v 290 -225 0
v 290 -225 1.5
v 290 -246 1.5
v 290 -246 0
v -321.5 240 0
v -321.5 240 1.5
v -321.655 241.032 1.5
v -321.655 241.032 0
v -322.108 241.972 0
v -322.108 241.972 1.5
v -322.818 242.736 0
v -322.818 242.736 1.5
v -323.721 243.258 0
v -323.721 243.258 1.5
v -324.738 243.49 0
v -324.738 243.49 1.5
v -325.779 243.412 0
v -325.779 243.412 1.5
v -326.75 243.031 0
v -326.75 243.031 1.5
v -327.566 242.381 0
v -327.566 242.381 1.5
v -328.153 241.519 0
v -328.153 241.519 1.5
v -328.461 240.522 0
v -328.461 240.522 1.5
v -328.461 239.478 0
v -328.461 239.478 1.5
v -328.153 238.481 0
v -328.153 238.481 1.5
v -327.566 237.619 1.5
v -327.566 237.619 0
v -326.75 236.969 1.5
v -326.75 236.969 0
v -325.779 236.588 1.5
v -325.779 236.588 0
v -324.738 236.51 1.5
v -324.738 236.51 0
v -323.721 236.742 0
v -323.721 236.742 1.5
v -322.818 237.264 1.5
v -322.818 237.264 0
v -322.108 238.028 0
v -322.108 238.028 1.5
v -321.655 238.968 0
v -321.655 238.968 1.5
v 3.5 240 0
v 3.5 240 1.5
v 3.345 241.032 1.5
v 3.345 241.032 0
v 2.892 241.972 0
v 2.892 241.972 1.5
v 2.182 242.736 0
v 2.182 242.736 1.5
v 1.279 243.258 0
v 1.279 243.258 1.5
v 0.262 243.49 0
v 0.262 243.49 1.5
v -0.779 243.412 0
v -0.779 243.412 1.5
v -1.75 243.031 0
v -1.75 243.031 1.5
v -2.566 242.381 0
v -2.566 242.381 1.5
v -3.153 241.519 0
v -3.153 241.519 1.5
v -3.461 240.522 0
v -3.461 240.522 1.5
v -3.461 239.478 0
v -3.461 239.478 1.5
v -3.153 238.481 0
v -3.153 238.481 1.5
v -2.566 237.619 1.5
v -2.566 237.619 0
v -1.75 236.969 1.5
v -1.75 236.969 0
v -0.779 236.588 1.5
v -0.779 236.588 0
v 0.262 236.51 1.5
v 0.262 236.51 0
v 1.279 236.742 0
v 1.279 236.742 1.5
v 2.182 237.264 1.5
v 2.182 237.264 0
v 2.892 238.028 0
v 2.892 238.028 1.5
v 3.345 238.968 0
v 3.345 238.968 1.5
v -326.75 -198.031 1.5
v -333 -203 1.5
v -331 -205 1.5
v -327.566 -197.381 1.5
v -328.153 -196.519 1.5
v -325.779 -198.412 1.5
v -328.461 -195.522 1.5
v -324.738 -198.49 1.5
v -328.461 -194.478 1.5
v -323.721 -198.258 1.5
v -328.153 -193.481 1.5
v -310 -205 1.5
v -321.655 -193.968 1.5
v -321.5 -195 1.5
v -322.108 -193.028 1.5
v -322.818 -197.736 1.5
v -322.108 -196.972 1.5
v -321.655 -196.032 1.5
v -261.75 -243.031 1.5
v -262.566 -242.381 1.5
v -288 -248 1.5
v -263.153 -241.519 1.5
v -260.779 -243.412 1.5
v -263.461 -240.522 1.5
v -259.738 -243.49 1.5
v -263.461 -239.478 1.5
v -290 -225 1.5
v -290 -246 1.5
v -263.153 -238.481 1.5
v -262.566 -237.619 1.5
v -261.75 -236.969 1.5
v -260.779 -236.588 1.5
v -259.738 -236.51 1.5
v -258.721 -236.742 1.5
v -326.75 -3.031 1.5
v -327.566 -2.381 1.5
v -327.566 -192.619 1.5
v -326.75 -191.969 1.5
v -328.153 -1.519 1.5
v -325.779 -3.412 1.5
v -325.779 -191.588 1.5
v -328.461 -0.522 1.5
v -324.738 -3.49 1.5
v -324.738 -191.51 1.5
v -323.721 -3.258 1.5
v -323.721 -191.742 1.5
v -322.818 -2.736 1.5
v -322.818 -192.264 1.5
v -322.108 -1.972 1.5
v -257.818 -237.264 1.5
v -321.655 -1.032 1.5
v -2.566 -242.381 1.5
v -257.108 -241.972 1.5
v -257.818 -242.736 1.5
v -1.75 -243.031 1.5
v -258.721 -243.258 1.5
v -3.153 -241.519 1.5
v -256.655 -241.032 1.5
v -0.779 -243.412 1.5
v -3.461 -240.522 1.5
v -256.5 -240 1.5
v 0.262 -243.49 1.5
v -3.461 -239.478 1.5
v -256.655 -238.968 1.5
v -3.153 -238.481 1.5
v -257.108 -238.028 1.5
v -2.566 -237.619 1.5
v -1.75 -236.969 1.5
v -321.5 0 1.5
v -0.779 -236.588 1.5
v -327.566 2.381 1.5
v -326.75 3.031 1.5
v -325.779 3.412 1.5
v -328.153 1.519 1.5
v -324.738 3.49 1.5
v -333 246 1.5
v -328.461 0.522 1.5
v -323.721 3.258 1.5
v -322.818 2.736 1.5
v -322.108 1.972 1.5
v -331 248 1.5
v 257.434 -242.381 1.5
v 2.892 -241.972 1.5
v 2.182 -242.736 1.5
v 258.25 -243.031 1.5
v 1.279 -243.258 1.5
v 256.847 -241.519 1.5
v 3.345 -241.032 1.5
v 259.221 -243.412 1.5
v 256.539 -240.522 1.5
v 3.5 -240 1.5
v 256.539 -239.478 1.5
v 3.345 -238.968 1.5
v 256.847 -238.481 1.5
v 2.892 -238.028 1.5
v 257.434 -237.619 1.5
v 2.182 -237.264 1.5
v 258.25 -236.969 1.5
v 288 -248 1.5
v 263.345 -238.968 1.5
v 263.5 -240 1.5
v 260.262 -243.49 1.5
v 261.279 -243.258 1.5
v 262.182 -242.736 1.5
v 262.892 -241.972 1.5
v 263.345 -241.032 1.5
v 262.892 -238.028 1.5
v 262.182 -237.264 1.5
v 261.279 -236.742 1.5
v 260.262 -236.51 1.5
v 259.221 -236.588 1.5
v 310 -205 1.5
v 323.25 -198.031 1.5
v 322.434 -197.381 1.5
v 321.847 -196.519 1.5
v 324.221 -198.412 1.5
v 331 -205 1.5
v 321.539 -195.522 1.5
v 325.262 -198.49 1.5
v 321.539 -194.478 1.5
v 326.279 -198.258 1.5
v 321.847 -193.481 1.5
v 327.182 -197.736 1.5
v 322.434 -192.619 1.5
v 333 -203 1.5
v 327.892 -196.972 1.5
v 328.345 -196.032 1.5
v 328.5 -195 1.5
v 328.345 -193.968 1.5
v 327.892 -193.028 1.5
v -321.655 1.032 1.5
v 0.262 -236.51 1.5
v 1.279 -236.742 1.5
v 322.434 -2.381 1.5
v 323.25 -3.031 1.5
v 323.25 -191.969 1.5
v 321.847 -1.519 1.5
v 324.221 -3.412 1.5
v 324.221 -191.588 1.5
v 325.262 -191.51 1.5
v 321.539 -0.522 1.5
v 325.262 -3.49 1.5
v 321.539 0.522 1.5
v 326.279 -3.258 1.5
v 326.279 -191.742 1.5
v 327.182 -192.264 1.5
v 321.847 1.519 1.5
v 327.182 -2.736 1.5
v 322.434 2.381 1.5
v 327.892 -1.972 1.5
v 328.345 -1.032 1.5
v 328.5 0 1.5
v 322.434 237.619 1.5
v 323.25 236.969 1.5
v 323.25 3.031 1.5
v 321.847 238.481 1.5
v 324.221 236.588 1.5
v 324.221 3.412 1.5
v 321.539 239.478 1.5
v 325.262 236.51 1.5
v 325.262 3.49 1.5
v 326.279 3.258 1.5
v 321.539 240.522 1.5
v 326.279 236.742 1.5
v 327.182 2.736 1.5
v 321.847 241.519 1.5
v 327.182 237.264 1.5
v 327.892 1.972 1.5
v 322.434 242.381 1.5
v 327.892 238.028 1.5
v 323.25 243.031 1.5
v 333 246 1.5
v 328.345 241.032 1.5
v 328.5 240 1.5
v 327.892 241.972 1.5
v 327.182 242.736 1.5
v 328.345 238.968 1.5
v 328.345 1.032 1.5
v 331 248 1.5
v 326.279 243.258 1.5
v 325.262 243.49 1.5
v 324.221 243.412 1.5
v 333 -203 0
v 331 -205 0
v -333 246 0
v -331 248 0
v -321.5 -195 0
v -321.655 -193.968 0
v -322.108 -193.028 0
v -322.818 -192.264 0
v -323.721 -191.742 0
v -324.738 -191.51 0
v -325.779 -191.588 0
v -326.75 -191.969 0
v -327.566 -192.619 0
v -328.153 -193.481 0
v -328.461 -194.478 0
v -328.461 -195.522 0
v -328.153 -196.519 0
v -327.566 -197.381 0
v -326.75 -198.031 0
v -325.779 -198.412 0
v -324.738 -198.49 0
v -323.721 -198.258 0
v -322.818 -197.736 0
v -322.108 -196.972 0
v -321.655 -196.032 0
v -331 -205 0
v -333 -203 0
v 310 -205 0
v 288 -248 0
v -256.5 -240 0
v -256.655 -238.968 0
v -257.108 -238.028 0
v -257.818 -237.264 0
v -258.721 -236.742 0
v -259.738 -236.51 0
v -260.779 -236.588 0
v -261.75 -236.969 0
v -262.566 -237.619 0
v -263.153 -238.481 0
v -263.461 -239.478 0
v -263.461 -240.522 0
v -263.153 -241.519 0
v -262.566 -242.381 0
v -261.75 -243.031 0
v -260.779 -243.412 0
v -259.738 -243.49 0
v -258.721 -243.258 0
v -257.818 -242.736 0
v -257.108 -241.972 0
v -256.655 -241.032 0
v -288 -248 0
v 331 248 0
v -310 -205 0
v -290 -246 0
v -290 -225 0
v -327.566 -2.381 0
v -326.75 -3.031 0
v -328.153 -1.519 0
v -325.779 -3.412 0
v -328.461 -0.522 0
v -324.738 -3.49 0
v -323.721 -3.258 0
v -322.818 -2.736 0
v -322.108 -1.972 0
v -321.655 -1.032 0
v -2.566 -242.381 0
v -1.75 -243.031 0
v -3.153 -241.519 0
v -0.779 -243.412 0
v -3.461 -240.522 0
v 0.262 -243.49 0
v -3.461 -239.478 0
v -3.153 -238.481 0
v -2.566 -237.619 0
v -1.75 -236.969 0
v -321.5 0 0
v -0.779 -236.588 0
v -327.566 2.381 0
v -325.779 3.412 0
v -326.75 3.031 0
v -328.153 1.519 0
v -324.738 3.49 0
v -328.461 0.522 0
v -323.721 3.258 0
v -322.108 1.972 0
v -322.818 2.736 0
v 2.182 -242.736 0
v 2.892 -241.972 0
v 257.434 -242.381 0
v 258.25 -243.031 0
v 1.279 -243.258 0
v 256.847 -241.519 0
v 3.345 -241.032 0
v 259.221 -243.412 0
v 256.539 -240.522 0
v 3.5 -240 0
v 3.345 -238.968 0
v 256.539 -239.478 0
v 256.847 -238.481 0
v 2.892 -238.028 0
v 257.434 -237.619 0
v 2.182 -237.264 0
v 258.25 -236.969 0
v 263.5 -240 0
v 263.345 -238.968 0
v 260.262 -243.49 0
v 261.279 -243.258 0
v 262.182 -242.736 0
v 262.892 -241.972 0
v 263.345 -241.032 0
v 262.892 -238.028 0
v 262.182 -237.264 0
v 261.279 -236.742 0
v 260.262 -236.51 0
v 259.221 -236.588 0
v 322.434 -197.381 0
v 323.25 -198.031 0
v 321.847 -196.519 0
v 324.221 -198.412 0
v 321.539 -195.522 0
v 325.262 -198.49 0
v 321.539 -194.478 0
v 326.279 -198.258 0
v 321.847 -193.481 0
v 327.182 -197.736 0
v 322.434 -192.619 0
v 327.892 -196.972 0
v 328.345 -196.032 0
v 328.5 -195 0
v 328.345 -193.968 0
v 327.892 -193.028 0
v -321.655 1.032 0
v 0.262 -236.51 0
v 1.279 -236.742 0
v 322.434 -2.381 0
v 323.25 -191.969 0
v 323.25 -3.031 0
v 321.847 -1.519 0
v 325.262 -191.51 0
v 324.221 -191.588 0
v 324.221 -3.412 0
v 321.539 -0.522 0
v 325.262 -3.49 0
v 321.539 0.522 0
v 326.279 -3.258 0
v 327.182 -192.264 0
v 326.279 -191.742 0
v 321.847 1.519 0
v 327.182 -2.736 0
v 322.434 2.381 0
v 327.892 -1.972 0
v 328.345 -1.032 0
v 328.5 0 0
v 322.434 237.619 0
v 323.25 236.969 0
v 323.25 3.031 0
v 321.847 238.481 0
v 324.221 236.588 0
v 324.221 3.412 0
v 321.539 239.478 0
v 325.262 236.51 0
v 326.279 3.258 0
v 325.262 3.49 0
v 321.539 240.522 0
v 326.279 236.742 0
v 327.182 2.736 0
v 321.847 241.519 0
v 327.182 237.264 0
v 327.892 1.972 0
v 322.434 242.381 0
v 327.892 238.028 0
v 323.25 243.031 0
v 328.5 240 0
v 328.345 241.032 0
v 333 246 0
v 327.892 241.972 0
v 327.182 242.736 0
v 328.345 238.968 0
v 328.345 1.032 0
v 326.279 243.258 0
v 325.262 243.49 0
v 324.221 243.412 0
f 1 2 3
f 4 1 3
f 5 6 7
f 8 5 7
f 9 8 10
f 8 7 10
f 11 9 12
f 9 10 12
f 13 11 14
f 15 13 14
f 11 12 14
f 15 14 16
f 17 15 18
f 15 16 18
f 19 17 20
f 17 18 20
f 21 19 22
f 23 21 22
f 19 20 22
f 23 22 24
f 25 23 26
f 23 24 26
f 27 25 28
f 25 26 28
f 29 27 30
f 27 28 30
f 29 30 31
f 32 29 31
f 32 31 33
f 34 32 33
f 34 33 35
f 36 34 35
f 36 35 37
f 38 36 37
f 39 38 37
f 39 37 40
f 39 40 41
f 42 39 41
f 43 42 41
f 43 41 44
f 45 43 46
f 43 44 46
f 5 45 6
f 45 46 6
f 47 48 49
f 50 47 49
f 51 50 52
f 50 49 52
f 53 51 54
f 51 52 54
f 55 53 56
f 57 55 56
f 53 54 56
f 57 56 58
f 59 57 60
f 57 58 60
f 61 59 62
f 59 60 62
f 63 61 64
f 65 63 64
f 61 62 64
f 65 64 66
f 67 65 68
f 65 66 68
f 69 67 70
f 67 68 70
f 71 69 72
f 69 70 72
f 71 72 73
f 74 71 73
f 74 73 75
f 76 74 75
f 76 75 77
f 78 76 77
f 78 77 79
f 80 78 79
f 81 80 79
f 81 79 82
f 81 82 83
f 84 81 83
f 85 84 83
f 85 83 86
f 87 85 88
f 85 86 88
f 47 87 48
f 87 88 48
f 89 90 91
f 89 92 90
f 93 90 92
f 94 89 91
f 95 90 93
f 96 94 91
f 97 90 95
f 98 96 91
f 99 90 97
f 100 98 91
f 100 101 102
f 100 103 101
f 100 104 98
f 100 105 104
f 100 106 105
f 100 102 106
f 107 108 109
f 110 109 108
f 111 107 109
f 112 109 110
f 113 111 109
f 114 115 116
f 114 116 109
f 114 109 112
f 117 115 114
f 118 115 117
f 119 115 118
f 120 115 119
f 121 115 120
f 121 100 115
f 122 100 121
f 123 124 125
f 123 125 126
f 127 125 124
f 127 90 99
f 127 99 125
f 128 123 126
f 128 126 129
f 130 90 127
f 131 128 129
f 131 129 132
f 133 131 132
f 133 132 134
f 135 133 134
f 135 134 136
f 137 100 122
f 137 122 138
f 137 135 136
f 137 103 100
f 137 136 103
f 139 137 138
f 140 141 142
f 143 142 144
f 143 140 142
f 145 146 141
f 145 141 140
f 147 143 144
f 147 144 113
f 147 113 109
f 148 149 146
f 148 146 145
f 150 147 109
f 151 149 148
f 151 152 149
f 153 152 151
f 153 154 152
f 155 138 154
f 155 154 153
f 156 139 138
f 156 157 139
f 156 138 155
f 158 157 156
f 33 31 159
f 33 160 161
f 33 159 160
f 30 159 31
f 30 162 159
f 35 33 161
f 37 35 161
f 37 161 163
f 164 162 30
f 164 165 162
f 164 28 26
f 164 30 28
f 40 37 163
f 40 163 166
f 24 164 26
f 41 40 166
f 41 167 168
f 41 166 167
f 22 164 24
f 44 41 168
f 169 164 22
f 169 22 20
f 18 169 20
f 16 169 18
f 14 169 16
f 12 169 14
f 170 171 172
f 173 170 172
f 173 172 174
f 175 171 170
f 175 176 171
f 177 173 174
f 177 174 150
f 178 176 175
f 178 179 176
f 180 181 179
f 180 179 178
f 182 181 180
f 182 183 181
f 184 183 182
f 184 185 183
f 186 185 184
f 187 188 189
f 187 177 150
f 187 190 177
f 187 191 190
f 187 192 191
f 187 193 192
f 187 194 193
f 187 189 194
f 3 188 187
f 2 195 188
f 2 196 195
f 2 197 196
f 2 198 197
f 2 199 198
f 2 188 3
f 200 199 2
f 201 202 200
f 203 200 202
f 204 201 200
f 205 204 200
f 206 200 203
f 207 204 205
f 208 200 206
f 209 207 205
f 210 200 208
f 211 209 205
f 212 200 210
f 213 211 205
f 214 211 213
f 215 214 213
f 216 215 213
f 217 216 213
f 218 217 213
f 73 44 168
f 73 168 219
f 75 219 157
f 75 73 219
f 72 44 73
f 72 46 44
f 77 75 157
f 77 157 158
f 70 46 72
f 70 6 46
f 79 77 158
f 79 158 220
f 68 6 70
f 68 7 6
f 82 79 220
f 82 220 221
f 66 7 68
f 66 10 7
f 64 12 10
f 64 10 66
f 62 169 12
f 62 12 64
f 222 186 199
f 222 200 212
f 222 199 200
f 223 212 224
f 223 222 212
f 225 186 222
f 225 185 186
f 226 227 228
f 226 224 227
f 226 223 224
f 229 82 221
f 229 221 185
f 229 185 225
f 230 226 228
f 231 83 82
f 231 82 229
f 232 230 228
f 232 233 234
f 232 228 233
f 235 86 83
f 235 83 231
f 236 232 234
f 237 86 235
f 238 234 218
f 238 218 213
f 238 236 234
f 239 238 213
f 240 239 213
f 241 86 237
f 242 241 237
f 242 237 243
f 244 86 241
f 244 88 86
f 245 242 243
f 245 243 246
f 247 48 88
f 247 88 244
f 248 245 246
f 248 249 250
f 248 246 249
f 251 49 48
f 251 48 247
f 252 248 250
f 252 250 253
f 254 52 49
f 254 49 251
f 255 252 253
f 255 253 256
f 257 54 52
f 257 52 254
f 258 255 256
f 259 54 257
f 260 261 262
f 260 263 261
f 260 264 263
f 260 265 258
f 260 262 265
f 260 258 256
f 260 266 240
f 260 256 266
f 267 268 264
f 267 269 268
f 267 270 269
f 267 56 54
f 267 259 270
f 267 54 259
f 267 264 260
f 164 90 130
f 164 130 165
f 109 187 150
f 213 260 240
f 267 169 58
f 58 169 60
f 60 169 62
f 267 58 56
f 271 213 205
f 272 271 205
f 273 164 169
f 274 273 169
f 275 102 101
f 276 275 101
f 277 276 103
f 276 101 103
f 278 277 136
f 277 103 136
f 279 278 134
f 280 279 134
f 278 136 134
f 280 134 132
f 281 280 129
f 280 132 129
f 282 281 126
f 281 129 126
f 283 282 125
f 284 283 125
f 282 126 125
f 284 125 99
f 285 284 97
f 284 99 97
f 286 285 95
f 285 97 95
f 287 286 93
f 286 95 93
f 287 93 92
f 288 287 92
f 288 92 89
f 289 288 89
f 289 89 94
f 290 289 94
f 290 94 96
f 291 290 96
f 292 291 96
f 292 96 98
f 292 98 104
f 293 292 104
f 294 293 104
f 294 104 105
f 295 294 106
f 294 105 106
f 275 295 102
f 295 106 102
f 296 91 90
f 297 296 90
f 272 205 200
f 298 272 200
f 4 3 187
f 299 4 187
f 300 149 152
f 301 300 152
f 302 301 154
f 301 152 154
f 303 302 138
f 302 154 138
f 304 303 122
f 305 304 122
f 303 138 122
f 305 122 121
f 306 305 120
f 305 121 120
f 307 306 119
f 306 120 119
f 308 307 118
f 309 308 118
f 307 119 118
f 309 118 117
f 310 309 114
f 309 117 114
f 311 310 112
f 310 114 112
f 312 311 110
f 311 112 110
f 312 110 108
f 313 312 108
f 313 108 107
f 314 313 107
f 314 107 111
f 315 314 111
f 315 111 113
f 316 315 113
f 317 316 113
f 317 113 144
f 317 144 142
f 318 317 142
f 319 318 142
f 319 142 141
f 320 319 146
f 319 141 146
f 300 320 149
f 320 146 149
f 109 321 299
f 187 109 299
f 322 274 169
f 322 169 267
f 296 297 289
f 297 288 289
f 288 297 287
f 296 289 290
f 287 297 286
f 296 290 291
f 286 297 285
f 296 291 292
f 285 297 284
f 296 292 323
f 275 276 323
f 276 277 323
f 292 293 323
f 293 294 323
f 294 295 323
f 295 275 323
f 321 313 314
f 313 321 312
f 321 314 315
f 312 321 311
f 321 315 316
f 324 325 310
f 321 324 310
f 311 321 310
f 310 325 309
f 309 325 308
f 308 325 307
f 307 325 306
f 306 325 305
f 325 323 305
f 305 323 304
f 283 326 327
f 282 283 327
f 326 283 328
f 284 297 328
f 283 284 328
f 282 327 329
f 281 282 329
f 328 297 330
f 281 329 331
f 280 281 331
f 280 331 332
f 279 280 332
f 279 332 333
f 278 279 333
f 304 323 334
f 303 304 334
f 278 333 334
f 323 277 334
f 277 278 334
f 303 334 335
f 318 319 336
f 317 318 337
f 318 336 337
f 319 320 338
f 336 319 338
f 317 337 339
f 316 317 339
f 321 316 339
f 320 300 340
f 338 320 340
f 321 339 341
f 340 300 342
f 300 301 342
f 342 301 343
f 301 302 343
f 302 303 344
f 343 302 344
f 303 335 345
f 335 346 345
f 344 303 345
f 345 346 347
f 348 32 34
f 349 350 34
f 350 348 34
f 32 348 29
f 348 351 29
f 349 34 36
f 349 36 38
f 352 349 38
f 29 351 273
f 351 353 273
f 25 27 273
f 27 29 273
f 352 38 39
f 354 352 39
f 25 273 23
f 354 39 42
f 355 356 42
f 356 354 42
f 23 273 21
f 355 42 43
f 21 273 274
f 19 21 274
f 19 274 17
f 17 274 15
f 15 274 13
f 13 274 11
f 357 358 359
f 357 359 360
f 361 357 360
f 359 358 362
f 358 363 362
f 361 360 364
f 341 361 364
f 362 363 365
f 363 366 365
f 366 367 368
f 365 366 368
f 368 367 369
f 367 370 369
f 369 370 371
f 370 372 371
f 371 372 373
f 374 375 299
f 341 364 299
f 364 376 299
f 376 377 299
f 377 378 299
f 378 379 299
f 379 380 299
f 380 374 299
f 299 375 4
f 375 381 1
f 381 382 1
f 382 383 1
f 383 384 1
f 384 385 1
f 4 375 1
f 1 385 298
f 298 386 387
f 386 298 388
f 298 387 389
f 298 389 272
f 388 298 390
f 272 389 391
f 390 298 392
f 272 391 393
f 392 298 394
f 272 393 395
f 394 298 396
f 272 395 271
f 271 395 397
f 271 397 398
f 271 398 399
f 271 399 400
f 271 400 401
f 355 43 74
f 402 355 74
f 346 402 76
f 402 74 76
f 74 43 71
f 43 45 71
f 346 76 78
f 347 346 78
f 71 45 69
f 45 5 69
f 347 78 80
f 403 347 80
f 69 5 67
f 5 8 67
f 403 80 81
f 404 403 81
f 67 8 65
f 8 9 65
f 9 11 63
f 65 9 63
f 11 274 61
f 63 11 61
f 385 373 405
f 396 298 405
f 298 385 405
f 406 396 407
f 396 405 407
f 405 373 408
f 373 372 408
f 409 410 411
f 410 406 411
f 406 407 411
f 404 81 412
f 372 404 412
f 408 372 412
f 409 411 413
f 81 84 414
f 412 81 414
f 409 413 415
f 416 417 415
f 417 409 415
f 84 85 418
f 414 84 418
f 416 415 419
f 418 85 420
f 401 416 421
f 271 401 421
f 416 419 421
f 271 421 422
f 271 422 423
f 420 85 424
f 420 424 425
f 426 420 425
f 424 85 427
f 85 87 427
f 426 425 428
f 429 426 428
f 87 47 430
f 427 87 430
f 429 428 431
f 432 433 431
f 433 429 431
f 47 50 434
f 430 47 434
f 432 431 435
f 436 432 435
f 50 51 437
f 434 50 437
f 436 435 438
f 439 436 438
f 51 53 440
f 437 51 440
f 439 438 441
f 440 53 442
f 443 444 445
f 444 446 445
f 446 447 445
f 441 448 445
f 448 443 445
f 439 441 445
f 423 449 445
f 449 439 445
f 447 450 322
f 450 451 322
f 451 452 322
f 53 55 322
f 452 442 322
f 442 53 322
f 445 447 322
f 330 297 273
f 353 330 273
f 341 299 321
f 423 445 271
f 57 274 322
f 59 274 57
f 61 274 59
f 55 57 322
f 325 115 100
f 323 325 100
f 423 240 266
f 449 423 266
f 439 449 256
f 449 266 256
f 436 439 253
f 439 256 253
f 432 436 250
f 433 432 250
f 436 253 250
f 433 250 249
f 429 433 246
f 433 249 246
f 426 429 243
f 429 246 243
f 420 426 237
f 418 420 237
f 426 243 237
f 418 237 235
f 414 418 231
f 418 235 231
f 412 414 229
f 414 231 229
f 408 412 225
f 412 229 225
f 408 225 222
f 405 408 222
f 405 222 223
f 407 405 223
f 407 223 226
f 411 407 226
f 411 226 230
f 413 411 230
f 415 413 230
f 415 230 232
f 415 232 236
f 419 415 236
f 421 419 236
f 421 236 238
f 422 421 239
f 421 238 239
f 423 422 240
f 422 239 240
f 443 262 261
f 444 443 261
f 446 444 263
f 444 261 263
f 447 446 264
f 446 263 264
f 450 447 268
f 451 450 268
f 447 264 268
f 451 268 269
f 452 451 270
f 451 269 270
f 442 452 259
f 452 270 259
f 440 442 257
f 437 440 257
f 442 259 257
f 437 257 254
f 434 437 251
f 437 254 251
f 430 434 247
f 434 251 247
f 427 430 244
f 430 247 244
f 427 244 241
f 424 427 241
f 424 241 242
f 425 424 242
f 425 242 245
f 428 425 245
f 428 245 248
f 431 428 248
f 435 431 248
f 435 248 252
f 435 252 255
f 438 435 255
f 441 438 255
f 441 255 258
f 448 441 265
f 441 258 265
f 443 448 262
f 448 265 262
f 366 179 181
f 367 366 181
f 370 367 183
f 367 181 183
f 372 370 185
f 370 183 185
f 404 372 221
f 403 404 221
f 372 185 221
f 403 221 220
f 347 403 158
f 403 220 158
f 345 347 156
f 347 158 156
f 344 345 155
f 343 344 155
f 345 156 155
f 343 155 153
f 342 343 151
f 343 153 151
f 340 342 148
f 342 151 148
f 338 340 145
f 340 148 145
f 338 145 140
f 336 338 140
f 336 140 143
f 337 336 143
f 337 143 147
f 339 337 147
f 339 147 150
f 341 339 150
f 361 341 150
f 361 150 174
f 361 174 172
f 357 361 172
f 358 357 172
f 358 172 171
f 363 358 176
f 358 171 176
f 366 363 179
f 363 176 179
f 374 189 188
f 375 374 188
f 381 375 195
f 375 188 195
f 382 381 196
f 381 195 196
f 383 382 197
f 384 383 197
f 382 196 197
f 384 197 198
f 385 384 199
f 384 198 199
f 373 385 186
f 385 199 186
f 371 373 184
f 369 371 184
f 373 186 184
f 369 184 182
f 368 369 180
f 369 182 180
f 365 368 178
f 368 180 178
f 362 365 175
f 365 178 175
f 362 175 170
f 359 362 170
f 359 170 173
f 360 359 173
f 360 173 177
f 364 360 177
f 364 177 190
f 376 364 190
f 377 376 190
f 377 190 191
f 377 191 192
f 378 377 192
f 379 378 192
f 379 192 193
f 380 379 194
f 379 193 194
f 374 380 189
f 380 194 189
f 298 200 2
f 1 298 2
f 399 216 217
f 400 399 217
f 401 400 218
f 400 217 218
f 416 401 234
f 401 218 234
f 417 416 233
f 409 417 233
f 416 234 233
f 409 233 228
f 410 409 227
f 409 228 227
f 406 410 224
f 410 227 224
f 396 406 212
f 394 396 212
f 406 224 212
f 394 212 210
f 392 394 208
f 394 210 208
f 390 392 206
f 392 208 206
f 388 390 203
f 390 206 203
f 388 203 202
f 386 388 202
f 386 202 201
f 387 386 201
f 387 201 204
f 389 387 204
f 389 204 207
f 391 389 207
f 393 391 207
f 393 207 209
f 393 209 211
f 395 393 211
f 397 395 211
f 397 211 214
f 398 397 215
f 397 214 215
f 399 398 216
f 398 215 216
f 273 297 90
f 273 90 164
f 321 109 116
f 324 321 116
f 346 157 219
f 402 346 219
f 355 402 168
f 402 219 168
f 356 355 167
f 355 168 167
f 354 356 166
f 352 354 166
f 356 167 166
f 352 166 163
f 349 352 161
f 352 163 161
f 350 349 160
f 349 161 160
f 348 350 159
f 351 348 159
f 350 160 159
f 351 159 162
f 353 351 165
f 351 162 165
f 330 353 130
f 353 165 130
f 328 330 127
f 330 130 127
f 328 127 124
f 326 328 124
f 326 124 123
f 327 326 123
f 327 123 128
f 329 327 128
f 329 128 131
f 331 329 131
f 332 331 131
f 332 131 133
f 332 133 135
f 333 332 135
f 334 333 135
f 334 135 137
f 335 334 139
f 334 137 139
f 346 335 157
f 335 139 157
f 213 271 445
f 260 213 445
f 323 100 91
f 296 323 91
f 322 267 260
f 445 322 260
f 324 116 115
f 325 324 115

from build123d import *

# Parameters (mm, degrees)
F0_W     = 666
F0_H     = 496
F1_DEPTH = 1.5
F2_R     = 3.5
F3_DEPTH = 1.5
F6_DEPTH = 1.5


with BuildPart() as f1:
    # F0 (on Top) → F1 (new body)
    with BuildSketch(Plane.XY):
        Rectangle(F0_W, F0_H)
    extrude(amount=F1_DEPTH)

    # F2 (on face) → F3 (cut, through all)
    with BuildSketch(Plane.XY.offset(1.5)):
        with Locations((-325, 240)):
            Circle(F2_R)
        with Locations((0, 240)):
            Circle(F2_R)
        with Locations((325, 240)):
            Circle(F2_R)
        with Locations((325, 0)):
            Circle(F2_R)
        with Locations((325, -195)):
            Circle(F2_R)
        with Locations((260, -240)):
            Circle(F2_R)
        with Locations((-260, -240)):
            Circle(F2_R)
        with Locations((-325, -195)):
            Circle(F2_R)
        with Locations((-325, 0)):
            Circle(F2_R)
        with Locations((0, -240)):
            Circle(F2_R)
    extrude(amount=-F3_DEPTH, mode=Mode.SUBTRACT)

    # F5 (on face) → F6 (cut, through all)
    with BuildSketch(Plane.XY.offset(1.5)):
        Polygon((-331, 248), (-333, 248), (-333, 246), align=None)
        Polygon((-333, -205), (-333, -248), (-290, -248), (-288, -248), (-290, -246), (-290, -225), (-310, -205), (-331, -205), (-333, -203), align=None)
        Polygon((333, 248), (331, 248), (333, 246), align=None)
        Polygon((333, -205), (333, -203), (331, -205), (310, -205), (290, -225), (290, -246), (288, -248), (290, -248), (333, -248), align=None)
    extrude(amount=-F6_DEPTH, mode=Mode.SUBTRACT)


solid = f1.part
